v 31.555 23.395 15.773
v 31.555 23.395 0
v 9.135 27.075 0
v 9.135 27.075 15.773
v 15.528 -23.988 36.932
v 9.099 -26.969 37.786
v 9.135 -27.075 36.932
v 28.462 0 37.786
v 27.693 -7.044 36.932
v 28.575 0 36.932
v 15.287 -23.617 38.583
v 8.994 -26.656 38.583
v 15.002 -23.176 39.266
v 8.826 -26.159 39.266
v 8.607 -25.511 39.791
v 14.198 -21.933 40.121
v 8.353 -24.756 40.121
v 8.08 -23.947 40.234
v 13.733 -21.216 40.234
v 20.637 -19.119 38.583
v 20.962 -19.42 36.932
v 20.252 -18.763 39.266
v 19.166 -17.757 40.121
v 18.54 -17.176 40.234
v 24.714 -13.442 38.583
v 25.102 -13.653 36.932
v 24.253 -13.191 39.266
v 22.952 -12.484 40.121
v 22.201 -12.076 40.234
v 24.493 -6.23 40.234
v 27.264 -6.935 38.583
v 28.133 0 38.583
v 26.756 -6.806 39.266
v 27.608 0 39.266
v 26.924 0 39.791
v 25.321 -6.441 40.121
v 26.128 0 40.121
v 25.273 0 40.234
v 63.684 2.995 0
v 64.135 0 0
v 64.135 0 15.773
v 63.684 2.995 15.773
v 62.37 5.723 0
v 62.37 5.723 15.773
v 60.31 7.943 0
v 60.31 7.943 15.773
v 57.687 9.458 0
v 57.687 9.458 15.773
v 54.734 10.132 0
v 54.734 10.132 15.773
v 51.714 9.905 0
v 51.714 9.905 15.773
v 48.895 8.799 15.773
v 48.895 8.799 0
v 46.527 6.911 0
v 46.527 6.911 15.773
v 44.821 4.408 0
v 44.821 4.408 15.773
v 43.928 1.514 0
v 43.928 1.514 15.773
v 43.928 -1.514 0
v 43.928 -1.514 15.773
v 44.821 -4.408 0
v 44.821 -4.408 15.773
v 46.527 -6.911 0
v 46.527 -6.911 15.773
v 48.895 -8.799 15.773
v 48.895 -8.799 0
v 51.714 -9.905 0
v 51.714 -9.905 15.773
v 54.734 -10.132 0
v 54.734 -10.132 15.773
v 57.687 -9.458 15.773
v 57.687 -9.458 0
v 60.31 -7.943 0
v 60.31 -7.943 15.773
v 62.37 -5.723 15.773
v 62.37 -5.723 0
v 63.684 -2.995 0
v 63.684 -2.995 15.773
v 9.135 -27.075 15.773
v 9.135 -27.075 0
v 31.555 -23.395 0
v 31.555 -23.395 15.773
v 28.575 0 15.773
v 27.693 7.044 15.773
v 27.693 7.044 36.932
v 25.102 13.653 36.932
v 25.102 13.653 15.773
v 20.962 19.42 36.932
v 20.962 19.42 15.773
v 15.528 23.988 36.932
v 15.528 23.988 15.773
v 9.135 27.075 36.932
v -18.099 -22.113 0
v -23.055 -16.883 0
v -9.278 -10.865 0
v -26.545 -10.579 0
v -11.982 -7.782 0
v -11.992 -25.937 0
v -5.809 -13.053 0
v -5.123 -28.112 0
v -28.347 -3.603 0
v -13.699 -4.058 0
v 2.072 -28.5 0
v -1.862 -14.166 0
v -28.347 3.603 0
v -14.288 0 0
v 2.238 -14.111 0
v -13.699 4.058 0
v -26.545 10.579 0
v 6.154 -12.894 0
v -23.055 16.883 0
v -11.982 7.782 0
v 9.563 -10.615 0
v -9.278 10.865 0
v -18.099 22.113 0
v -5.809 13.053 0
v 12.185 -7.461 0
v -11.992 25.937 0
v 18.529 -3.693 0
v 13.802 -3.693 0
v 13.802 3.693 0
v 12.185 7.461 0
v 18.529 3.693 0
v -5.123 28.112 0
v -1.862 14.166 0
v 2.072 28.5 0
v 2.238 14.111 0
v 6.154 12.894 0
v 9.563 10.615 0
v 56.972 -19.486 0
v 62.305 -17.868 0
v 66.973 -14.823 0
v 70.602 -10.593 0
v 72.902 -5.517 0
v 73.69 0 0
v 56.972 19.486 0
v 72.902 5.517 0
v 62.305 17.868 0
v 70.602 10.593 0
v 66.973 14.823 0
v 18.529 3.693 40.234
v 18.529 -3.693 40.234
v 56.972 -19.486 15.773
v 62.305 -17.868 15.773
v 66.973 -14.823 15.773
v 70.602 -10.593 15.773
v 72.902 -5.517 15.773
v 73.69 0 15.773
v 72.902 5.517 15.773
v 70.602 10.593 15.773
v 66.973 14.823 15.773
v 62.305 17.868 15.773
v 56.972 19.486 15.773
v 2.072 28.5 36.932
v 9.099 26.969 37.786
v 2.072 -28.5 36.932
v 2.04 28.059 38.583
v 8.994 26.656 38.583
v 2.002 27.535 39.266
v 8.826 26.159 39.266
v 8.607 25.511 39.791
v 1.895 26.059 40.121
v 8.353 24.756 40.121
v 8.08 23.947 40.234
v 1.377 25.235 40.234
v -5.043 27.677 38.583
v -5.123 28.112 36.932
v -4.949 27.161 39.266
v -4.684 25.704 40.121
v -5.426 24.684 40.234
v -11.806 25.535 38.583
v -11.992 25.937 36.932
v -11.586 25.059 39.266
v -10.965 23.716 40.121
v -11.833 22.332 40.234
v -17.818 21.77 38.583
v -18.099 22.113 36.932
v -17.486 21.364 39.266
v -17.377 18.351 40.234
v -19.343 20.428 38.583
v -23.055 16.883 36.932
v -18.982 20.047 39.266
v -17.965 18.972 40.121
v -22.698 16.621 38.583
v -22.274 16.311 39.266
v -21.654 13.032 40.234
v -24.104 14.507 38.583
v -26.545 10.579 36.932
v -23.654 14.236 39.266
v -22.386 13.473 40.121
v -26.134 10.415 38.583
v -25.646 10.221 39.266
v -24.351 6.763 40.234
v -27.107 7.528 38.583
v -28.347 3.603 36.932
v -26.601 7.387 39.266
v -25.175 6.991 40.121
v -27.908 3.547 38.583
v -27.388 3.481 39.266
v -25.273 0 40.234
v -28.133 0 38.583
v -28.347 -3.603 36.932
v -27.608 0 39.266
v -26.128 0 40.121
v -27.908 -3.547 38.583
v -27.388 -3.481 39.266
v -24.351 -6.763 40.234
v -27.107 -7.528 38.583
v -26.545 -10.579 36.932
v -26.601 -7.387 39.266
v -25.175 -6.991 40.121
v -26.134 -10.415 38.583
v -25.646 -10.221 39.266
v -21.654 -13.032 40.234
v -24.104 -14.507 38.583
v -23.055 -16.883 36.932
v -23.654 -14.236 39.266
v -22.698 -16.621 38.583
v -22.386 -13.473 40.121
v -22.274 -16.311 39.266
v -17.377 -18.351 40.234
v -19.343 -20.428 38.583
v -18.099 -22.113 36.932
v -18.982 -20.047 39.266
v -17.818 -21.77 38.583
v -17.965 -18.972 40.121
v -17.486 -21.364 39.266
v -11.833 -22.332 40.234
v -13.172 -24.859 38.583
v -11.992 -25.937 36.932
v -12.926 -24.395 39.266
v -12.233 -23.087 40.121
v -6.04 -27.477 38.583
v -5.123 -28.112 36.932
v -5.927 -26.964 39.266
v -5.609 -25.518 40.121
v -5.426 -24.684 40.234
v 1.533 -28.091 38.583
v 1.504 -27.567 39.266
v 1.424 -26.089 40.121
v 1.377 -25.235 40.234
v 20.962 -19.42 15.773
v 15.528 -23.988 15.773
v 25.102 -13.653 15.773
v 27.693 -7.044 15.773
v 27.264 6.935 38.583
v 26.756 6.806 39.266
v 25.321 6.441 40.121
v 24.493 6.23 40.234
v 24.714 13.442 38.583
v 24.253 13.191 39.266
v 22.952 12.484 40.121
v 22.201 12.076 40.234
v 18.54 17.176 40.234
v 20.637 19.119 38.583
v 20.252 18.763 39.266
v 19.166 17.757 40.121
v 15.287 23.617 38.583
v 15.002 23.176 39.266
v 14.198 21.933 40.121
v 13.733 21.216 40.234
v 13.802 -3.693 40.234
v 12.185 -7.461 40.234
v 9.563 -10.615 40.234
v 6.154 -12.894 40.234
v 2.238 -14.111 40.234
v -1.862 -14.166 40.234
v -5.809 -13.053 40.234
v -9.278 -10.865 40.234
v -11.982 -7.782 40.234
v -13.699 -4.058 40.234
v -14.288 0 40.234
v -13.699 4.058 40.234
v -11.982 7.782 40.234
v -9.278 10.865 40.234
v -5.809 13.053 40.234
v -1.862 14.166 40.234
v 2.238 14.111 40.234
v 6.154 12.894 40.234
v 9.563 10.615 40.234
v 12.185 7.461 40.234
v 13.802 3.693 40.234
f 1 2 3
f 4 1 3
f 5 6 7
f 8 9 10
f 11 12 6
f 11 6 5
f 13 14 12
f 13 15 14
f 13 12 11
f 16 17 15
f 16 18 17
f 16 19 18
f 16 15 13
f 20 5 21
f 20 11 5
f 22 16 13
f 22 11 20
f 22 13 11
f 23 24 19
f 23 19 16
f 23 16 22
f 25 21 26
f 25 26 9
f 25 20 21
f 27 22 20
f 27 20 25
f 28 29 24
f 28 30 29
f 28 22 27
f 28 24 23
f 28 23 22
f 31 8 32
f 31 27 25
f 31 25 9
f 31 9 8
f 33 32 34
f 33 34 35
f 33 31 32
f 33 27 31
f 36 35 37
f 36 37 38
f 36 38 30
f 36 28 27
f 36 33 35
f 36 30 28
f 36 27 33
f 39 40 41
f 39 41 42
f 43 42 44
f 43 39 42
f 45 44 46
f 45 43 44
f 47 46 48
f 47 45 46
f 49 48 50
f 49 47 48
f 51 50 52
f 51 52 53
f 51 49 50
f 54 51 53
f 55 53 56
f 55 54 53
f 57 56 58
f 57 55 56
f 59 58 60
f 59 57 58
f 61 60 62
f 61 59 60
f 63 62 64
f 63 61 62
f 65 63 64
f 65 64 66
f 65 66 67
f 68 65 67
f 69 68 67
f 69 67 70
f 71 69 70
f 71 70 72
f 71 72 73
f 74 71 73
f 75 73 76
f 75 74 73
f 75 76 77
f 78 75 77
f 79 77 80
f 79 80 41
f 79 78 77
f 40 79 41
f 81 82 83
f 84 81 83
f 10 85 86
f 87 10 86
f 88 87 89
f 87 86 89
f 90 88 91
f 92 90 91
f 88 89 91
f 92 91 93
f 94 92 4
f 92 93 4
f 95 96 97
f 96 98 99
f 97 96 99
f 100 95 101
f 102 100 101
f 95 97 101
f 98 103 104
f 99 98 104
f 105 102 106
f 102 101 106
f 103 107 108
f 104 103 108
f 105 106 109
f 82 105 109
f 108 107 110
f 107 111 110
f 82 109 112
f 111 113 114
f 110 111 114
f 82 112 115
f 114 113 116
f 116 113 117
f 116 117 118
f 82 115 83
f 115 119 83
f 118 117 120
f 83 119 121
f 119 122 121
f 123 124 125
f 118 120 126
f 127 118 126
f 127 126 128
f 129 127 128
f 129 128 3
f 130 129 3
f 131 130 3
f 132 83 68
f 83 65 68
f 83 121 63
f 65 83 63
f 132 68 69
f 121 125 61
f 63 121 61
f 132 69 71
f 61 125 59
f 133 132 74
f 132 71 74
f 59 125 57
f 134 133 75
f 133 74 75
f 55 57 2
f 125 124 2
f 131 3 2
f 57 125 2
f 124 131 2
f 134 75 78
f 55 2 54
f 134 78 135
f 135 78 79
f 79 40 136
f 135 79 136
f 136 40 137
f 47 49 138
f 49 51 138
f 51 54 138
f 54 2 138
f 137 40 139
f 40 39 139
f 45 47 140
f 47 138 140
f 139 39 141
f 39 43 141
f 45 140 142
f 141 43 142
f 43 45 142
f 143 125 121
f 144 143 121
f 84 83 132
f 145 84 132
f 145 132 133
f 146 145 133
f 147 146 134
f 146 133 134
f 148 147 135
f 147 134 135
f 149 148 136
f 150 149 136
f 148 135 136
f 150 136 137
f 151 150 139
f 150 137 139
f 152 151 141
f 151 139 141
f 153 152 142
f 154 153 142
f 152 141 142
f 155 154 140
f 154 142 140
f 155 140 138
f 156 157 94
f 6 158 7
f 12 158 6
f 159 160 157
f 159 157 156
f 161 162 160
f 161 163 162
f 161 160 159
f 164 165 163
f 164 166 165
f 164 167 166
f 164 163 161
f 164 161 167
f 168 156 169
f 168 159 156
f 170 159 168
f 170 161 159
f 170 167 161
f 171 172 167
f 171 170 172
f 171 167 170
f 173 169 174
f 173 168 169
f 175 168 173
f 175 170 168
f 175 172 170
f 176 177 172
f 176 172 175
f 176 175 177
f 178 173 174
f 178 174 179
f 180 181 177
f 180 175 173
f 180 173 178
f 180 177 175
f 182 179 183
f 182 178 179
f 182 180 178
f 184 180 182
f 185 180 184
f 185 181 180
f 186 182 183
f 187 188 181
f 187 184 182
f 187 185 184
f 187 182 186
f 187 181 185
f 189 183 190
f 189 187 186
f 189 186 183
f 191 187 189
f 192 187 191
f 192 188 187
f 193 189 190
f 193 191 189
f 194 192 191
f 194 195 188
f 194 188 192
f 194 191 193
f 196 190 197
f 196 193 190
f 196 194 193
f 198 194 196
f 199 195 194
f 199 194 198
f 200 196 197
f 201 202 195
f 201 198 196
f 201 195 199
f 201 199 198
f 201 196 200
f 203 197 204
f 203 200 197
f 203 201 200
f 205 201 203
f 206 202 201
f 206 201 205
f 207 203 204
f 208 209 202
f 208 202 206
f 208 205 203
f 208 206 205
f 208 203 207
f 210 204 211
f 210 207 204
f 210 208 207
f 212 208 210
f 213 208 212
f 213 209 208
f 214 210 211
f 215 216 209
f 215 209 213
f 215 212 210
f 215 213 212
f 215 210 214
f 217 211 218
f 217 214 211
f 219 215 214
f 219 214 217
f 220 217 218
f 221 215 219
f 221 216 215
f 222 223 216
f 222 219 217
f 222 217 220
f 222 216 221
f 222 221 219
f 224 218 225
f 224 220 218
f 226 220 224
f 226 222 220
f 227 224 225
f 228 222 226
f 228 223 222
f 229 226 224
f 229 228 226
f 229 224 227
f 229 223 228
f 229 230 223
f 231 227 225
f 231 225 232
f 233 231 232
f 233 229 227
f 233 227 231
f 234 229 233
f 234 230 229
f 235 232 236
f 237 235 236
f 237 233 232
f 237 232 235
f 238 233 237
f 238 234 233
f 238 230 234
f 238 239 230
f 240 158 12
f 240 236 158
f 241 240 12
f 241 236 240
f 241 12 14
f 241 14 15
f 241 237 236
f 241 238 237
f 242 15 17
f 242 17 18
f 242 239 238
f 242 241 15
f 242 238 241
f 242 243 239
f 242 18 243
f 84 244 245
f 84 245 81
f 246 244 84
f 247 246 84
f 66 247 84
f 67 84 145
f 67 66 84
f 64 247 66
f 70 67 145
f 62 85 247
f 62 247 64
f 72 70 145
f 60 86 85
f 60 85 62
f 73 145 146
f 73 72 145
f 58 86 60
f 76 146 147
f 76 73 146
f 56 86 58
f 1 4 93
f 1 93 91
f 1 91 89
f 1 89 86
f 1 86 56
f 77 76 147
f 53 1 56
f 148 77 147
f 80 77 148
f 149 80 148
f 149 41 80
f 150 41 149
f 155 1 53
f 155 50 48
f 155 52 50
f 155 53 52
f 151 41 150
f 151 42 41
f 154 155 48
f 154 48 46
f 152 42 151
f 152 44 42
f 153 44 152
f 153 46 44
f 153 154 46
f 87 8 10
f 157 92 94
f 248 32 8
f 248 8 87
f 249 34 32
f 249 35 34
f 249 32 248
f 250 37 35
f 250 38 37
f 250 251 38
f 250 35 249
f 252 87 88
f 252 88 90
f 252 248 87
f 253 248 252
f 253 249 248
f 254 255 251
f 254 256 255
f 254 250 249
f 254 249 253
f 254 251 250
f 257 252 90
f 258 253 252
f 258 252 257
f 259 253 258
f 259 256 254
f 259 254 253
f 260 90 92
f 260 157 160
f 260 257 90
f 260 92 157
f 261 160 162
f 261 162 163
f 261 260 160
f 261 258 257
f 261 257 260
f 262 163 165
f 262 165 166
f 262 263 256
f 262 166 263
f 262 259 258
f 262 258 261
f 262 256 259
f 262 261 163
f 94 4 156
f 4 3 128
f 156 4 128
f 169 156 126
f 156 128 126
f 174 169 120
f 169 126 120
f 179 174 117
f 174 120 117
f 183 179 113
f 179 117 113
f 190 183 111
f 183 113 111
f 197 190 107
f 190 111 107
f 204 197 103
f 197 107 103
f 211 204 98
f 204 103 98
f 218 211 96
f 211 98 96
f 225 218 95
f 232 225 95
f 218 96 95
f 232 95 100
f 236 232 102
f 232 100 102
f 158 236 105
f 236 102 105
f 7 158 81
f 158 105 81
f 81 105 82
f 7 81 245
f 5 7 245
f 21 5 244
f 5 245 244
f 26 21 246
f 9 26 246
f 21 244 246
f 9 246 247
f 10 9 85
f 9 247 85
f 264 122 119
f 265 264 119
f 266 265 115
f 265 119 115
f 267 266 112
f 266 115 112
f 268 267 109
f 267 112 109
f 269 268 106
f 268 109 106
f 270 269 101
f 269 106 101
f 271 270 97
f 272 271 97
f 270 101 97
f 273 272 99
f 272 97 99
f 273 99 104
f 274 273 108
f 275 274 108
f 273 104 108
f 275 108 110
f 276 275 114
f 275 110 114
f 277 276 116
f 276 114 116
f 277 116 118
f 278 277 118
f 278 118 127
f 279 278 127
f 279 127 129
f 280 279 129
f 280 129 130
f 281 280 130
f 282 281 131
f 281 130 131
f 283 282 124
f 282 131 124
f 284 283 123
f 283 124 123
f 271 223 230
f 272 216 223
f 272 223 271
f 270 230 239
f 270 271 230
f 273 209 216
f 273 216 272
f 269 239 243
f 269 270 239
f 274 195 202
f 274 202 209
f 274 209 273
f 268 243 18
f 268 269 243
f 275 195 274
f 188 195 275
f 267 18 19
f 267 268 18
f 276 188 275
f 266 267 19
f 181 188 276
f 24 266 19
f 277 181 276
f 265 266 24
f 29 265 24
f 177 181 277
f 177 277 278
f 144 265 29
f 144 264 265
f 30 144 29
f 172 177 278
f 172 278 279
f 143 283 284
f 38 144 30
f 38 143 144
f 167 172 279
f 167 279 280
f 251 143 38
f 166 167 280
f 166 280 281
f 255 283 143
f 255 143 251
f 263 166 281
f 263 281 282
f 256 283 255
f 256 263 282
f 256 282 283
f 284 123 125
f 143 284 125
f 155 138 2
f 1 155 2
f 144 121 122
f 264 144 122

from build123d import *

# Parameters (mm, degrees)
F1_DEPTH = 40.2336
F0_R     = 10.16
F2_DEPTH = 15.7734
F3_R     = 3.302


with BuildPart() as f1:
    # F0 (on Top) → F1 (new body)
    with BuildSketch(Plane.XY):
        with BuildLine():
            ThreePointArc((9.135252, -27.075409), (23.211748, -16.665695), (28.575, 0))
            ThreePointArc((28.575, 0), (23.211748, 16.665695), (9.135252, 27.075409))
            ThreePointArc((9.135252, 27.075409), (-28.575, 0), (9.135252, -27.075409))
        make_face()
        with BuildLine():
            ThreePointArc((13.801996, -3.692906), (-14.2875, 0), (13.801996, 3.692906))
            Line((13.801996, 3.692906), (18.5293, 3.692906))
            Line((18.5293, 3.692906), (18.5293, -3.692906))
            Line((18.5293, -3.692906), (13.801996, -3.692906))
        make_face(mode=Mode.SUBTRACT)
    extrude(amount=F1_DEPTH)

    # F0 (on Top) → F2 (join)
    with BuildSketch(Plane.XY):
        with BuildLine():
            ThreePointArc((9.135252, 27.075409), (23.211748, 16.665695), (28.575, 0))
            ThreePointArc((28.575, 0), (23.211748, -16.665695), (9.135252, -27.075409))
            Line((9.135252, -27.075409), (31.555126, -23.395091))
            Line((31.555126, -23.395091), (56.972144, -19.485621))
            ThreePointArc((56.972144, -19.485621), (73.689773, 0), (56.972144, 19.485621))
            Line((56.972144, 19.485621), (31.555126, 23.395091))
            Line((31.555126, 23.395091), (9.135252, 27.075409))
        make_face()
        with Locations((53.975, 0)):
            Circle(F0_R, mode=Mode.SUBTRACT)
    extrude(amount=F2_DEPTH)

    # F3
    f3_edges = [f1.edges().sort_by_distance(p)[0] for p in [
        (-9.135252, 27.075409, 40.2336),
    ]]
    fillet(f3_edges, radius=F3_R)


solid = f1.part
